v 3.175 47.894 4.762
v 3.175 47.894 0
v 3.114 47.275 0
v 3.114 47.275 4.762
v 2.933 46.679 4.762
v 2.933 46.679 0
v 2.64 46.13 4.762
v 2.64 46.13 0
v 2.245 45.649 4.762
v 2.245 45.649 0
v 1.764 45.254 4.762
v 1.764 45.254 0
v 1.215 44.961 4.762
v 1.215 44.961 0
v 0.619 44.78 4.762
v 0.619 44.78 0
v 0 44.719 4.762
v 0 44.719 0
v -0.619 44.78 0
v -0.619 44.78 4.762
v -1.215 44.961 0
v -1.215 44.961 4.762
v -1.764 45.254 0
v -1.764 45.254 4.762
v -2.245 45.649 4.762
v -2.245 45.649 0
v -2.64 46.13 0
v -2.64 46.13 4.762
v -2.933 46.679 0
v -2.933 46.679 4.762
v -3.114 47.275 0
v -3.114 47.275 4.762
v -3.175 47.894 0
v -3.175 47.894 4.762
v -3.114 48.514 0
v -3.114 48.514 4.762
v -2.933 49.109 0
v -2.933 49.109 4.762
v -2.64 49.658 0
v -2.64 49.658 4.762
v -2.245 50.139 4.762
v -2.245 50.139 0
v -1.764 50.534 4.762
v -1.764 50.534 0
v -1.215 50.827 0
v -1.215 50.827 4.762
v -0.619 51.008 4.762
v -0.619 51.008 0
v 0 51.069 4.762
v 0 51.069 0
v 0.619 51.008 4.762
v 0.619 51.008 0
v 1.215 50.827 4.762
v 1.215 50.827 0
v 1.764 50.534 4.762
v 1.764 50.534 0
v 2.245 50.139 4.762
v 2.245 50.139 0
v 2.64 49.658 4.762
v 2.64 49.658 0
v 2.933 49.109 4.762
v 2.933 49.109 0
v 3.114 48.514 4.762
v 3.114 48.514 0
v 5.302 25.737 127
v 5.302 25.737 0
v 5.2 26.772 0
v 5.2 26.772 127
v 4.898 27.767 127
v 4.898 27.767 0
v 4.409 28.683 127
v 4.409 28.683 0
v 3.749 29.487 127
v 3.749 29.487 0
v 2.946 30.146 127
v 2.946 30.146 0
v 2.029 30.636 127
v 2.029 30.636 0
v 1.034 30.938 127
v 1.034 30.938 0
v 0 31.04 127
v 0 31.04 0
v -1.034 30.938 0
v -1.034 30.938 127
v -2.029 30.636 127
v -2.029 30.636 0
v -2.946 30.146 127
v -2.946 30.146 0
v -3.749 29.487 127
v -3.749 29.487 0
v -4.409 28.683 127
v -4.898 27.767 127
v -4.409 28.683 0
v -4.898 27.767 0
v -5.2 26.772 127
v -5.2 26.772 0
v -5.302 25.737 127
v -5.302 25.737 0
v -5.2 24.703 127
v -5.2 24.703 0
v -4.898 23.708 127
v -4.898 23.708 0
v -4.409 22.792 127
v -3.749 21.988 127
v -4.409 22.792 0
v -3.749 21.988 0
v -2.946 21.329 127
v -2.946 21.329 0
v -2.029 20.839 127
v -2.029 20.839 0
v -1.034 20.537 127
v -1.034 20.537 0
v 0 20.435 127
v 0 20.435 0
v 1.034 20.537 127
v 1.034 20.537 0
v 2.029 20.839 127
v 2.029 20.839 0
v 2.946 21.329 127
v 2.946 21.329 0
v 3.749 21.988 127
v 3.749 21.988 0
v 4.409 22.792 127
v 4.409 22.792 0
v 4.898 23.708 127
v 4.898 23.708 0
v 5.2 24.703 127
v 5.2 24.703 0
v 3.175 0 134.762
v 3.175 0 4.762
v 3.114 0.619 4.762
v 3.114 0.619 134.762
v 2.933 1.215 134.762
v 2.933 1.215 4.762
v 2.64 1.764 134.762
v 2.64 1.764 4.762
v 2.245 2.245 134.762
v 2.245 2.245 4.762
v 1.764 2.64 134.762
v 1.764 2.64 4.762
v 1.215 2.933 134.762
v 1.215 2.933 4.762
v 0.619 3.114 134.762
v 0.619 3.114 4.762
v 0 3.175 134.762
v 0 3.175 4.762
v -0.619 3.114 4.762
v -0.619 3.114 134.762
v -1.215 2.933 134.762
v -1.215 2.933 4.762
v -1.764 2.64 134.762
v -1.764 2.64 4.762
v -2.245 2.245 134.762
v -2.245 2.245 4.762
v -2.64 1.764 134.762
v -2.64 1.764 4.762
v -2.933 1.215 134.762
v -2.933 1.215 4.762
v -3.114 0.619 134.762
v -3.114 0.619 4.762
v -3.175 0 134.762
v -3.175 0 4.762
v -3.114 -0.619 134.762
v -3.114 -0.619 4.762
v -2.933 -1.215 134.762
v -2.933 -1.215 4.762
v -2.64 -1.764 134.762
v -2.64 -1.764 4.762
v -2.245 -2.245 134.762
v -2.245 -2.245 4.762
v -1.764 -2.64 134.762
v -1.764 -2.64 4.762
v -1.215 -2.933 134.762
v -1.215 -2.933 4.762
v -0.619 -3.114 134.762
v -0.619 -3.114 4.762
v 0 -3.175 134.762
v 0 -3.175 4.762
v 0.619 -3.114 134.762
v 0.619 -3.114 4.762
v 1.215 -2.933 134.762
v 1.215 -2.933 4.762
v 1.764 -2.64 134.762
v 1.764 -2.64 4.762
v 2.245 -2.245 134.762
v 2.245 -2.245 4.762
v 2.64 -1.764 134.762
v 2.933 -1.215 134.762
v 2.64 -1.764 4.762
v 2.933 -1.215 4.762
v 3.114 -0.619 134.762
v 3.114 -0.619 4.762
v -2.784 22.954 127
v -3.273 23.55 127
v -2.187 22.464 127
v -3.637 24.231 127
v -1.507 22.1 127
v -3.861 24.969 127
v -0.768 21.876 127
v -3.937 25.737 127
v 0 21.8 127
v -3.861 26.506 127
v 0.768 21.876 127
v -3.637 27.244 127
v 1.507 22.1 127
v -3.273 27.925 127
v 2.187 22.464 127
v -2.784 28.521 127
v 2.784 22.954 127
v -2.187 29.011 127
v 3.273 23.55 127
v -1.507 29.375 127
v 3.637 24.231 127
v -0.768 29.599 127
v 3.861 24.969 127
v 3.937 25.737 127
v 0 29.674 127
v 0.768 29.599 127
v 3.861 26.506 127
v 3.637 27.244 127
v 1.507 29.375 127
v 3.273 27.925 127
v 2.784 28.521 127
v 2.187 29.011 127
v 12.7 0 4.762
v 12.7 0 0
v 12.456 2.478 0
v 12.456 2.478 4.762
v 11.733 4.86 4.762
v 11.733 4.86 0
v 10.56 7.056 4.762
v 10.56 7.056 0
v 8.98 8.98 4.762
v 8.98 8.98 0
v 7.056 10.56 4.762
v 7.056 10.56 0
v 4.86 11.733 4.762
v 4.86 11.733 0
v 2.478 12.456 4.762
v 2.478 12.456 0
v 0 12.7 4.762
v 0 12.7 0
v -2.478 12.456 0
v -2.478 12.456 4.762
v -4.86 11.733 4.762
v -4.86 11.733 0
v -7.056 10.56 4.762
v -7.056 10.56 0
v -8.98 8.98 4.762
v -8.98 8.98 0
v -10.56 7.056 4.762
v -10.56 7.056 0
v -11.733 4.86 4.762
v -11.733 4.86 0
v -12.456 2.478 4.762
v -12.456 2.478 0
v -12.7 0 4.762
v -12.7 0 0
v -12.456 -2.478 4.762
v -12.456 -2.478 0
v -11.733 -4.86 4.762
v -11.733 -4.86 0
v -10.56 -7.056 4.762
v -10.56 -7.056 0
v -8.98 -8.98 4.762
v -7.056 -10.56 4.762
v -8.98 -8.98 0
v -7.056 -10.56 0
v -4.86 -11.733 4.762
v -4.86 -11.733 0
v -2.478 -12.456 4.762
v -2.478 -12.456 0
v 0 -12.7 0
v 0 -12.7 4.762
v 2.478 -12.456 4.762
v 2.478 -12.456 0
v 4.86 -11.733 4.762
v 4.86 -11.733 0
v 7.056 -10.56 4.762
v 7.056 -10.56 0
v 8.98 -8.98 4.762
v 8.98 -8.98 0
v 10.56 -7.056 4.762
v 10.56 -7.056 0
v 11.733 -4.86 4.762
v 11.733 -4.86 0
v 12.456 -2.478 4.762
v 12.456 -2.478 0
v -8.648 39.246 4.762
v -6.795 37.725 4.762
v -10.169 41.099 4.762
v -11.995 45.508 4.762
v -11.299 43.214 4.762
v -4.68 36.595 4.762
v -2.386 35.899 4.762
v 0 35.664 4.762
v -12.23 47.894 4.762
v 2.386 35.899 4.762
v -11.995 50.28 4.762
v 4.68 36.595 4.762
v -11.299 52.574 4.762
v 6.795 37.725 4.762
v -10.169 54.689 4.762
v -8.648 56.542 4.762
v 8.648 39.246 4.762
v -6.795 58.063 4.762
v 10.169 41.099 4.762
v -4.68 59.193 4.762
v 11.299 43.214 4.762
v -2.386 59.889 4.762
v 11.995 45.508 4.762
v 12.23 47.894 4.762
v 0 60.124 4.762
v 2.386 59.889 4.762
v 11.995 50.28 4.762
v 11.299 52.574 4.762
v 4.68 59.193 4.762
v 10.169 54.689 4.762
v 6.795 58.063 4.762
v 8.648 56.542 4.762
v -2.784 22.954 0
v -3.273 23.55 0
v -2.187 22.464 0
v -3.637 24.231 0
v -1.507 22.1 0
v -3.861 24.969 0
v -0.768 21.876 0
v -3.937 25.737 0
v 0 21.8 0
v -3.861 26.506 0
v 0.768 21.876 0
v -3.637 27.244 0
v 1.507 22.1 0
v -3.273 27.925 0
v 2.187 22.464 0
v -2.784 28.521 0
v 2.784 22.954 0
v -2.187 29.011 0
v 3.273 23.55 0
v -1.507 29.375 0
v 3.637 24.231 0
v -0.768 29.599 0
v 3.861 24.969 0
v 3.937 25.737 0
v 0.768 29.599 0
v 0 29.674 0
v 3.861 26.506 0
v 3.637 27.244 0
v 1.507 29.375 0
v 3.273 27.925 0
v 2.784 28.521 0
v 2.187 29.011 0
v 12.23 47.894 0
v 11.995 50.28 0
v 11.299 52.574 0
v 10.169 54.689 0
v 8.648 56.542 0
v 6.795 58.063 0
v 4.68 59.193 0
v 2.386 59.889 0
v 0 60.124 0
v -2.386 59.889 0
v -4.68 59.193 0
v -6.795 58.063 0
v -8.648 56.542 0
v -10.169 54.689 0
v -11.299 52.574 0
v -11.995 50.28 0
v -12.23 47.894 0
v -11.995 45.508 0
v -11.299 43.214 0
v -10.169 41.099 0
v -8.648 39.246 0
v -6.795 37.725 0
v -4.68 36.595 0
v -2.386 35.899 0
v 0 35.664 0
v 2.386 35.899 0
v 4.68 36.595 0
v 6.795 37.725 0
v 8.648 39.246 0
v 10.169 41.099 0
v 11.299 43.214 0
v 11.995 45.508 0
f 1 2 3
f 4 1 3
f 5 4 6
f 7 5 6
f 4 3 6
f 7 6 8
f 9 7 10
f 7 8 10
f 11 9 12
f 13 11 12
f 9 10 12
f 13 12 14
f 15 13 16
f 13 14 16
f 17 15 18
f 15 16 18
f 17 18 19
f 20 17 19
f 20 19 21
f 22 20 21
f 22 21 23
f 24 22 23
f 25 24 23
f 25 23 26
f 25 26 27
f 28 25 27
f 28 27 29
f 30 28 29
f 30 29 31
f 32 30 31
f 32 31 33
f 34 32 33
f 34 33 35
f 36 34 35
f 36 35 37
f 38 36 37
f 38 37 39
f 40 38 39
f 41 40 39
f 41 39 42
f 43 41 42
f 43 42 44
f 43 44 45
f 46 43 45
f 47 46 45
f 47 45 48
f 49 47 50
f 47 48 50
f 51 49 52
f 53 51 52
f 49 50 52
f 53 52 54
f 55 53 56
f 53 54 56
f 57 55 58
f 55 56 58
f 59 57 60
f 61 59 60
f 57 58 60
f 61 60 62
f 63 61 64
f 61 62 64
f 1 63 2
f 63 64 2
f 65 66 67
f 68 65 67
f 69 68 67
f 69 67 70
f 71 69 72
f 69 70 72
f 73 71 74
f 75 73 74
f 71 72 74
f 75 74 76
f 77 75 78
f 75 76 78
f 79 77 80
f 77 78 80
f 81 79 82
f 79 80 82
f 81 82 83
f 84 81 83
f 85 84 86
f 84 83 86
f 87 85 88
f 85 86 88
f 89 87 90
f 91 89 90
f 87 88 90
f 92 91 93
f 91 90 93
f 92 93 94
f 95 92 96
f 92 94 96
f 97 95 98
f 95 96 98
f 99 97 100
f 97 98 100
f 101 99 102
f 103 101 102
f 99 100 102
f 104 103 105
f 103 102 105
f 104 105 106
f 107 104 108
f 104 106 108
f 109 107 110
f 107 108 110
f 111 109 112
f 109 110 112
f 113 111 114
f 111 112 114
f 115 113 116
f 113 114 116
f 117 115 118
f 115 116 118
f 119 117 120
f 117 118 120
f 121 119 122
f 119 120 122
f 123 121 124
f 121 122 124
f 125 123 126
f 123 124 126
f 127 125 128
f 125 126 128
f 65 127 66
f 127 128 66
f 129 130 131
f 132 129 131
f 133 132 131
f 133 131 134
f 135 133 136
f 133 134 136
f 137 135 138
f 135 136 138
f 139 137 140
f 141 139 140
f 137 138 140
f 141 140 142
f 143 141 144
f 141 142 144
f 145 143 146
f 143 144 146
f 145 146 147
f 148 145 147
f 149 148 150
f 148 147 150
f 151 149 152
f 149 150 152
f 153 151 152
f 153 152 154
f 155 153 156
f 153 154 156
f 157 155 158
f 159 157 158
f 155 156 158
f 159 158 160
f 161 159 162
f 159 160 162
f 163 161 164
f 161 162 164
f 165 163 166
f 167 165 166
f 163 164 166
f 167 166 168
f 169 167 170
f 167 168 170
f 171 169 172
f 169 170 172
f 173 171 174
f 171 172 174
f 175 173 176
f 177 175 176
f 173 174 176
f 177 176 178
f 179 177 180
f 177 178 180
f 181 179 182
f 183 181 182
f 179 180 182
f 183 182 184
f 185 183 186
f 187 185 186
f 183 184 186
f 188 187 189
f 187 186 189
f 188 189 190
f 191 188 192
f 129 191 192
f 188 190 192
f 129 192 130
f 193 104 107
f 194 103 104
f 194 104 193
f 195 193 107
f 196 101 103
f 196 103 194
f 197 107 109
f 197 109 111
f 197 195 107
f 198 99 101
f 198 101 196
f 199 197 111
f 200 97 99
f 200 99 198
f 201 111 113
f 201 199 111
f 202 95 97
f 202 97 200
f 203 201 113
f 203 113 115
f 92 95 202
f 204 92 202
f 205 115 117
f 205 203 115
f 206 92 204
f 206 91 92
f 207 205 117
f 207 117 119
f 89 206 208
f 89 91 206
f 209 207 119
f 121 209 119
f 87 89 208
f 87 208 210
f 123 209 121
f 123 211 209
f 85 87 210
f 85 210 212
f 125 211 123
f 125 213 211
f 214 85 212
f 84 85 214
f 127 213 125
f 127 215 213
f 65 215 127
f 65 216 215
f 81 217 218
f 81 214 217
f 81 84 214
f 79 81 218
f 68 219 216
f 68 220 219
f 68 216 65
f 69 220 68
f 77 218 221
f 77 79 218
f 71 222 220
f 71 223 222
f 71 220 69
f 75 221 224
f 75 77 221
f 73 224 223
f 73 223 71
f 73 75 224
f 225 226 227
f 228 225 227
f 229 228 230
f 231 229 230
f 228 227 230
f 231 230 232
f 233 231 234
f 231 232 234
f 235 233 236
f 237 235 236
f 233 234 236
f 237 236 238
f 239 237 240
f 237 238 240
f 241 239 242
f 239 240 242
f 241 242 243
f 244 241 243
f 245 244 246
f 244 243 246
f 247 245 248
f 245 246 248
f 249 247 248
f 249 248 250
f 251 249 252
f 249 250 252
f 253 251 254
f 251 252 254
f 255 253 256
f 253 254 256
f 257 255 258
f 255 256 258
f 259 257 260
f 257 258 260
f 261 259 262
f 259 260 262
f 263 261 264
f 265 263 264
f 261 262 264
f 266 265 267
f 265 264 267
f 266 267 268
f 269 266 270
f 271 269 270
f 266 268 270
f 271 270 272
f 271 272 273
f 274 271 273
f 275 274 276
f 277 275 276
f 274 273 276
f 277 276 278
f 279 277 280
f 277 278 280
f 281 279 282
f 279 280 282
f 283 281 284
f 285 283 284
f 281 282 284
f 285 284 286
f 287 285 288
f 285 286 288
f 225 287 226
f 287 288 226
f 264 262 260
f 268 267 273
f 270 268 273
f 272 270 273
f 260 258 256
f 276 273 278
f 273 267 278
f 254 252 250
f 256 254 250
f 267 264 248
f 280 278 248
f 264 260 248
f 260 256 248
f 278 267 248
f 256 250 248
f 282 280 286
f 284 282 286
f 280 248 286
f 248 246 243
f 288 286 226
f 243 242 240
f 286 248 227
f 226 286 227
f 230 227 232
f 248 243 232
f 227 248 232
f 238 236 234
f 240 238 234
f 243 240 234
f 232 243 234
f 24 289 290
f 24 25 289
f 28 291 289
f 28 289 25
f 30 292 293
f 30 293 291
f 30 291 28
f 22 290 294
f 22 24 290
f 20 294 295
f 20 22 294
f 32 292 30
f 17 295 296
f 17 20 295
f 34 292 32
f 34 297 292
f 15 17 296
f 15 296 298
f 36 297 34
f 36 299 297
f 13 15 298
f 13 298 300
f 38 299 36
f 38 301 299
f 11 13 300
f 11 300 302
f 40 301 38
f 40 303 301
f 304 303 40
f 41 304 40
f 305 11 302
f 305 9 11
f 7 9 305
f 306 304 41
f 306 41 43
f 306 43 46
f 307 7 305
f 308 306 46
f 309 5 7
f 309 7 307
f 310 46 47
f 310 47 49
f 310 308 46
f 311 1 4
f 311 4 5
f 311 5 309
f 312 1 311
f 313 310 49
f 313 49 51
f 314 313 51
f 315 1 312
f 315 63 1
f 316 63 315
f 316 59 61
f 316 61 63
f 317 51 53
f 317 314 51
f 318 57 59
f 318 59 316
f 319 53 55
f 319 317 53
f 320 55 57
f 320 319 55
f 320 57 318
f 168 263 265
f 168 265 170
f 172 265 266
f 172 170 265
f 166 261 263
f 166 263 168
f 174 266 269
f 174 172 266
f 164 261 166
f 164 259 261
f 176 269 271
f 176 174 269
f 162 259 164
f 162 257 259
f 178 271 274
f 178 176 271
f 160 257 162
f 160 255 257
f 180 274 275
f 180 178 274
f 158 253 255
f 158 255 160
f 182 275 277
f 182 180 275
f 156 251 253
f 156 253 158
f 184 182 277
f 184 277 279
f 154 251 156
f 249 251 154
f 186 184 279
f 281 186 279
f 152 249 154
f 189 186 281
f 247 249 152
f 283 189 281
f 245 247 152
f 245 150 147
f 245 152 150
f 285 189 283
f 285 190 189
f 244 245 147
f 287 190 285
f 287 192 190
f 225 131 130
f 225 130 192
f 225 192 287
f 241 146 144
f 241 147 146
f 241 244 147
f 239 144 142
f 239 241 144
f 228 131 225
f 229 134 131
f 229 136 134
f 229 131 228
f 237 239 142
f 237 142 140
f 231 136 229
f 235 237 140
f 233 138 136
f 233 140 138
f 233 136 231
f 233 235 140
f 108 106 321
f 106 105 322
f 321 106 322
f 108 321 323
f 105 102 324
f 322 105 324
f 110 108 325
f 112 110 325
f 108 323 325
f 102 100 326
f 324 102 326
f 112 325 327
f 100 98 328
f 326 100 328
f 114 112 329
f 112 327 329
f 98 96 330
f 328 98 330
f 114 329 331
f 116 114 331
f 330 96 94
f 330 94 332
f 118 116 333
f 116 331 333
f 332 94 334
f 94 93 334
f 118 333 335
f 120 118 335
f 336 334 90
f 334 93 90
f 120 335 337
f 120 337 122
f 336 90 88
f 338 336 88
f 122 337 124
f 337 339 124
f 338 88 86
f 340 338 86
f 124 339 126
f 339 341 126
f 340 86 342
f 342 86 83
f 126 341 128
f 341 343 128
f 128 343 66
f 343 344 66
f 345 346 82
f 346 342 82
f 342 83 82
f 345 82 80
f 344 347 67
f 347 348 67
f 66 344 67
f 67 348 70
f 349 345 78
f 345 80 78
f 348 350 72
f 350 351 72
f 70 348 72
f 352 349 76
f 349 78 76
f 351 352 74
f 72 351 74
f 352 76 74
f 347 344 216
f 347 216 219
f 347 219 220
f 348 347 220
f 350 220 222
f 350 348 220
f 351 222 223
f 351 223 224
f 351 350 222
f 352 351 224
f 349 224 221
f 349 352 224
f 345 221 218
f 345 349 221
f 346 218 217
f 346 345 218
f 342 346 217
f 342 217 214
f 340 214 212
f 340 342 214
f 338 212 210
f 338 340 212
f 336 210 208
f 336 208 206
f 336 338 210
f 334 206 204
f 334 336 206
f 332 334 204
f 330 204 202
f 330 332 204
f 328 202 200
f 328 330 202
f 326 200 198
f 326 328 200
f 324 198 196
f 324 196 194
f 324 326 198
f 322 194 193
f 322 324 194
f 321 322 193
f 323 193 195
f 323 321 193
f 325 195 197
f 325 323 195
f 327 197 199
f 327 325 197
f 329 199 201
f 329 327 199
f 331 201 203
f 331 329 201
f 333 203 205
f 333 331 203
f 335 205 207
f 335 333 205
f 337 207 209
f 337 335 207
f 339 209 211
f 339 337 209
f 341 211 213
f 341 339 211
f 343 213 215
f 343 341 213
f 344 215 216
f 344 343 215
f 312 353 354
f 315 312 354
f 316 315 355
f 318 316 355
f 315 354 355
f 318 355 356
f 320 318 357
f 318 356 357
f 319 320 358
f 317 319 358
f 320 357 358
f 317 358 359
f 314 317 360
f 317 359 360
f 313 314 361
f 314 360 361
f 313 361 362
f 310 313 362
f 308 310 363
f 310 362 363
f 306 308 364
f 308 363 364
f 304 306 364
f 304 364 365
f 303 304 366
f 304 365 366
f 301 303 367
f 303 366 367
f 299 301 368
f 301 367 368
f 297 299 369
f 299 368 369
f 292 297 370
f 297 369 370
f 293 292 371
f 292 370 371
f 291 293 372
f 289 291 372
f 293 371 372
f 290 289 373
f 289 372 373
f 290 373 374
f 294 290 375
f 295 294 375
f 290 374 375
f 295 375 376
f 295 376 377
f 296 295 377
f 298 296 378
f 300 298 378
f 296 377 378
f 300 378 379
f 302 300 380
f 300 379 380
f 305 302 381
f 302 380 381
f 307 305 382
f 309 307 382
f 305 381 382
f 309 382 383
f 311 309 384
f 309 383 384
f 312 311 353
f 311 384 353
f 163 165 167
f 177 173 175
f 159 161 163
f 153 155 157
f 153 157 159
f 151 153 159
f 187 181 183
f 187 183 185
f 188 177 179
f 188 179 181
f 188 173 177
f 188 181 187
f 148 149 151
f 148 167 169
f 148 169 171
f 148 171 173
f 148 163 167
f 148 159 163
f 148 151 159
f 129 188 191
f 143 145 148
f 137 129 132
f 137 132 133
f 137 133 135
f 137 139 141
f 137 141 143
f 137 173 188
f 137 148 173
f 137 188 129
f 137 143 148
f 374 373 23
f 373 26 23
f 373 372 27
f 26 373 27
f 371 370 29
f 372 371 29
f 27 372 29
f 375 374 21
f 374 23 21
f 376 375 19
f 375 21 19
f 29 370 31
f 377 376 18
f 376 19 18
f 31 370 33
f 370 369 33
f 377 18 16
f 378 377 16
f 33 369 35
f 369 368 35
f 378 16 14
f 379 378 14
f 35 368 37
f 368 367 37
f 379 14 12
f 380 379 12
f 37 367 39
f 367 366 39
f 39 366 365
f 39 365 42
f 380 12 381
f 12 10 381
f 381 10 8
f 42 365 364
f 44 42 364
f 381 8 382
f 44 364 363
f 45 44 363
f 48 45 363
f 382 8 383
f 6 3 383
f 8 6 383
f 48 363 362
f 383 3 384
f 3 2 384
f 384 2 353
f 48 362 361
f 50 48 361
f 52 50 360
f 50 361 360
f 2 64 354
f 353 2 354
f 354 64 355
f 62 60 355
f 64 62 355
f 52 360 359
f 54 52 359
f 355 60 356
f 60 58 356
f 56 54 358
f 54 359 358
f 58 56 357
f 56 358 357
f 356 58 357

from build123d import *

# Parameters (mm, degrees)
F0_R     = 12.7
F1_DEPTH = 4.7625
F2_R     = 3.175
F3_DEPTH = 130
F4_R     = 12.230137
F5_DEPTH = 4.7625
F6_R     = 3.175
F7_DEPTH = 6.8072
F8_R     = 5.302083
F8_R_2   = 3.937
F9_DEPTH = 127


with BuildPart() as f1:
    # F0 (on Top) → F1 (new body)
    with BuildSketch(Plane.XY):
        Circle(F0_R)
    extrude(amount=F1_DEPTH)

    # F2 (on face) → F3 (join)
    with BuildSketch(Plane.XY.offset(4.7625)):
        Circle(F2_R)
    extrude(amount=F3_DEPTH)


with BuildPart() as f5:
    # F4 (on Top) → F5 (new body)
    with BuildSketch(Plane.XY):
        with Locations((0, 47.894098)):
            Circle(F4_R)
    extrude(amount=F5_DEPTH)

    # F6 (on face) → F7 (cut)
    with BuildSketch(Plane(origin=(0, 0, 0), x_dir=(1, 0, 0), z_dir=(0, 0, -1))):
        with Locations((0, -47.894098)):
            Circle(F6_R)
    extrude(amount=-F7_DEPTH, mode=Mode.SUBTRACT)


with BuildPart() as f9:
    # F8 (on Top) → F9 (new body)
    with BuildSketch(Plane.XY):
        with Locations((0, 25.737481)):
            Circle(F8_R)
        with Locations((0, 25.737481)):
            Circle(F8_R_2, mode=Mode.SUBTRACT)
    extrude(amount=F9_DEPTH)


solid = Compound([f1.part, f5.part, f9.part])
